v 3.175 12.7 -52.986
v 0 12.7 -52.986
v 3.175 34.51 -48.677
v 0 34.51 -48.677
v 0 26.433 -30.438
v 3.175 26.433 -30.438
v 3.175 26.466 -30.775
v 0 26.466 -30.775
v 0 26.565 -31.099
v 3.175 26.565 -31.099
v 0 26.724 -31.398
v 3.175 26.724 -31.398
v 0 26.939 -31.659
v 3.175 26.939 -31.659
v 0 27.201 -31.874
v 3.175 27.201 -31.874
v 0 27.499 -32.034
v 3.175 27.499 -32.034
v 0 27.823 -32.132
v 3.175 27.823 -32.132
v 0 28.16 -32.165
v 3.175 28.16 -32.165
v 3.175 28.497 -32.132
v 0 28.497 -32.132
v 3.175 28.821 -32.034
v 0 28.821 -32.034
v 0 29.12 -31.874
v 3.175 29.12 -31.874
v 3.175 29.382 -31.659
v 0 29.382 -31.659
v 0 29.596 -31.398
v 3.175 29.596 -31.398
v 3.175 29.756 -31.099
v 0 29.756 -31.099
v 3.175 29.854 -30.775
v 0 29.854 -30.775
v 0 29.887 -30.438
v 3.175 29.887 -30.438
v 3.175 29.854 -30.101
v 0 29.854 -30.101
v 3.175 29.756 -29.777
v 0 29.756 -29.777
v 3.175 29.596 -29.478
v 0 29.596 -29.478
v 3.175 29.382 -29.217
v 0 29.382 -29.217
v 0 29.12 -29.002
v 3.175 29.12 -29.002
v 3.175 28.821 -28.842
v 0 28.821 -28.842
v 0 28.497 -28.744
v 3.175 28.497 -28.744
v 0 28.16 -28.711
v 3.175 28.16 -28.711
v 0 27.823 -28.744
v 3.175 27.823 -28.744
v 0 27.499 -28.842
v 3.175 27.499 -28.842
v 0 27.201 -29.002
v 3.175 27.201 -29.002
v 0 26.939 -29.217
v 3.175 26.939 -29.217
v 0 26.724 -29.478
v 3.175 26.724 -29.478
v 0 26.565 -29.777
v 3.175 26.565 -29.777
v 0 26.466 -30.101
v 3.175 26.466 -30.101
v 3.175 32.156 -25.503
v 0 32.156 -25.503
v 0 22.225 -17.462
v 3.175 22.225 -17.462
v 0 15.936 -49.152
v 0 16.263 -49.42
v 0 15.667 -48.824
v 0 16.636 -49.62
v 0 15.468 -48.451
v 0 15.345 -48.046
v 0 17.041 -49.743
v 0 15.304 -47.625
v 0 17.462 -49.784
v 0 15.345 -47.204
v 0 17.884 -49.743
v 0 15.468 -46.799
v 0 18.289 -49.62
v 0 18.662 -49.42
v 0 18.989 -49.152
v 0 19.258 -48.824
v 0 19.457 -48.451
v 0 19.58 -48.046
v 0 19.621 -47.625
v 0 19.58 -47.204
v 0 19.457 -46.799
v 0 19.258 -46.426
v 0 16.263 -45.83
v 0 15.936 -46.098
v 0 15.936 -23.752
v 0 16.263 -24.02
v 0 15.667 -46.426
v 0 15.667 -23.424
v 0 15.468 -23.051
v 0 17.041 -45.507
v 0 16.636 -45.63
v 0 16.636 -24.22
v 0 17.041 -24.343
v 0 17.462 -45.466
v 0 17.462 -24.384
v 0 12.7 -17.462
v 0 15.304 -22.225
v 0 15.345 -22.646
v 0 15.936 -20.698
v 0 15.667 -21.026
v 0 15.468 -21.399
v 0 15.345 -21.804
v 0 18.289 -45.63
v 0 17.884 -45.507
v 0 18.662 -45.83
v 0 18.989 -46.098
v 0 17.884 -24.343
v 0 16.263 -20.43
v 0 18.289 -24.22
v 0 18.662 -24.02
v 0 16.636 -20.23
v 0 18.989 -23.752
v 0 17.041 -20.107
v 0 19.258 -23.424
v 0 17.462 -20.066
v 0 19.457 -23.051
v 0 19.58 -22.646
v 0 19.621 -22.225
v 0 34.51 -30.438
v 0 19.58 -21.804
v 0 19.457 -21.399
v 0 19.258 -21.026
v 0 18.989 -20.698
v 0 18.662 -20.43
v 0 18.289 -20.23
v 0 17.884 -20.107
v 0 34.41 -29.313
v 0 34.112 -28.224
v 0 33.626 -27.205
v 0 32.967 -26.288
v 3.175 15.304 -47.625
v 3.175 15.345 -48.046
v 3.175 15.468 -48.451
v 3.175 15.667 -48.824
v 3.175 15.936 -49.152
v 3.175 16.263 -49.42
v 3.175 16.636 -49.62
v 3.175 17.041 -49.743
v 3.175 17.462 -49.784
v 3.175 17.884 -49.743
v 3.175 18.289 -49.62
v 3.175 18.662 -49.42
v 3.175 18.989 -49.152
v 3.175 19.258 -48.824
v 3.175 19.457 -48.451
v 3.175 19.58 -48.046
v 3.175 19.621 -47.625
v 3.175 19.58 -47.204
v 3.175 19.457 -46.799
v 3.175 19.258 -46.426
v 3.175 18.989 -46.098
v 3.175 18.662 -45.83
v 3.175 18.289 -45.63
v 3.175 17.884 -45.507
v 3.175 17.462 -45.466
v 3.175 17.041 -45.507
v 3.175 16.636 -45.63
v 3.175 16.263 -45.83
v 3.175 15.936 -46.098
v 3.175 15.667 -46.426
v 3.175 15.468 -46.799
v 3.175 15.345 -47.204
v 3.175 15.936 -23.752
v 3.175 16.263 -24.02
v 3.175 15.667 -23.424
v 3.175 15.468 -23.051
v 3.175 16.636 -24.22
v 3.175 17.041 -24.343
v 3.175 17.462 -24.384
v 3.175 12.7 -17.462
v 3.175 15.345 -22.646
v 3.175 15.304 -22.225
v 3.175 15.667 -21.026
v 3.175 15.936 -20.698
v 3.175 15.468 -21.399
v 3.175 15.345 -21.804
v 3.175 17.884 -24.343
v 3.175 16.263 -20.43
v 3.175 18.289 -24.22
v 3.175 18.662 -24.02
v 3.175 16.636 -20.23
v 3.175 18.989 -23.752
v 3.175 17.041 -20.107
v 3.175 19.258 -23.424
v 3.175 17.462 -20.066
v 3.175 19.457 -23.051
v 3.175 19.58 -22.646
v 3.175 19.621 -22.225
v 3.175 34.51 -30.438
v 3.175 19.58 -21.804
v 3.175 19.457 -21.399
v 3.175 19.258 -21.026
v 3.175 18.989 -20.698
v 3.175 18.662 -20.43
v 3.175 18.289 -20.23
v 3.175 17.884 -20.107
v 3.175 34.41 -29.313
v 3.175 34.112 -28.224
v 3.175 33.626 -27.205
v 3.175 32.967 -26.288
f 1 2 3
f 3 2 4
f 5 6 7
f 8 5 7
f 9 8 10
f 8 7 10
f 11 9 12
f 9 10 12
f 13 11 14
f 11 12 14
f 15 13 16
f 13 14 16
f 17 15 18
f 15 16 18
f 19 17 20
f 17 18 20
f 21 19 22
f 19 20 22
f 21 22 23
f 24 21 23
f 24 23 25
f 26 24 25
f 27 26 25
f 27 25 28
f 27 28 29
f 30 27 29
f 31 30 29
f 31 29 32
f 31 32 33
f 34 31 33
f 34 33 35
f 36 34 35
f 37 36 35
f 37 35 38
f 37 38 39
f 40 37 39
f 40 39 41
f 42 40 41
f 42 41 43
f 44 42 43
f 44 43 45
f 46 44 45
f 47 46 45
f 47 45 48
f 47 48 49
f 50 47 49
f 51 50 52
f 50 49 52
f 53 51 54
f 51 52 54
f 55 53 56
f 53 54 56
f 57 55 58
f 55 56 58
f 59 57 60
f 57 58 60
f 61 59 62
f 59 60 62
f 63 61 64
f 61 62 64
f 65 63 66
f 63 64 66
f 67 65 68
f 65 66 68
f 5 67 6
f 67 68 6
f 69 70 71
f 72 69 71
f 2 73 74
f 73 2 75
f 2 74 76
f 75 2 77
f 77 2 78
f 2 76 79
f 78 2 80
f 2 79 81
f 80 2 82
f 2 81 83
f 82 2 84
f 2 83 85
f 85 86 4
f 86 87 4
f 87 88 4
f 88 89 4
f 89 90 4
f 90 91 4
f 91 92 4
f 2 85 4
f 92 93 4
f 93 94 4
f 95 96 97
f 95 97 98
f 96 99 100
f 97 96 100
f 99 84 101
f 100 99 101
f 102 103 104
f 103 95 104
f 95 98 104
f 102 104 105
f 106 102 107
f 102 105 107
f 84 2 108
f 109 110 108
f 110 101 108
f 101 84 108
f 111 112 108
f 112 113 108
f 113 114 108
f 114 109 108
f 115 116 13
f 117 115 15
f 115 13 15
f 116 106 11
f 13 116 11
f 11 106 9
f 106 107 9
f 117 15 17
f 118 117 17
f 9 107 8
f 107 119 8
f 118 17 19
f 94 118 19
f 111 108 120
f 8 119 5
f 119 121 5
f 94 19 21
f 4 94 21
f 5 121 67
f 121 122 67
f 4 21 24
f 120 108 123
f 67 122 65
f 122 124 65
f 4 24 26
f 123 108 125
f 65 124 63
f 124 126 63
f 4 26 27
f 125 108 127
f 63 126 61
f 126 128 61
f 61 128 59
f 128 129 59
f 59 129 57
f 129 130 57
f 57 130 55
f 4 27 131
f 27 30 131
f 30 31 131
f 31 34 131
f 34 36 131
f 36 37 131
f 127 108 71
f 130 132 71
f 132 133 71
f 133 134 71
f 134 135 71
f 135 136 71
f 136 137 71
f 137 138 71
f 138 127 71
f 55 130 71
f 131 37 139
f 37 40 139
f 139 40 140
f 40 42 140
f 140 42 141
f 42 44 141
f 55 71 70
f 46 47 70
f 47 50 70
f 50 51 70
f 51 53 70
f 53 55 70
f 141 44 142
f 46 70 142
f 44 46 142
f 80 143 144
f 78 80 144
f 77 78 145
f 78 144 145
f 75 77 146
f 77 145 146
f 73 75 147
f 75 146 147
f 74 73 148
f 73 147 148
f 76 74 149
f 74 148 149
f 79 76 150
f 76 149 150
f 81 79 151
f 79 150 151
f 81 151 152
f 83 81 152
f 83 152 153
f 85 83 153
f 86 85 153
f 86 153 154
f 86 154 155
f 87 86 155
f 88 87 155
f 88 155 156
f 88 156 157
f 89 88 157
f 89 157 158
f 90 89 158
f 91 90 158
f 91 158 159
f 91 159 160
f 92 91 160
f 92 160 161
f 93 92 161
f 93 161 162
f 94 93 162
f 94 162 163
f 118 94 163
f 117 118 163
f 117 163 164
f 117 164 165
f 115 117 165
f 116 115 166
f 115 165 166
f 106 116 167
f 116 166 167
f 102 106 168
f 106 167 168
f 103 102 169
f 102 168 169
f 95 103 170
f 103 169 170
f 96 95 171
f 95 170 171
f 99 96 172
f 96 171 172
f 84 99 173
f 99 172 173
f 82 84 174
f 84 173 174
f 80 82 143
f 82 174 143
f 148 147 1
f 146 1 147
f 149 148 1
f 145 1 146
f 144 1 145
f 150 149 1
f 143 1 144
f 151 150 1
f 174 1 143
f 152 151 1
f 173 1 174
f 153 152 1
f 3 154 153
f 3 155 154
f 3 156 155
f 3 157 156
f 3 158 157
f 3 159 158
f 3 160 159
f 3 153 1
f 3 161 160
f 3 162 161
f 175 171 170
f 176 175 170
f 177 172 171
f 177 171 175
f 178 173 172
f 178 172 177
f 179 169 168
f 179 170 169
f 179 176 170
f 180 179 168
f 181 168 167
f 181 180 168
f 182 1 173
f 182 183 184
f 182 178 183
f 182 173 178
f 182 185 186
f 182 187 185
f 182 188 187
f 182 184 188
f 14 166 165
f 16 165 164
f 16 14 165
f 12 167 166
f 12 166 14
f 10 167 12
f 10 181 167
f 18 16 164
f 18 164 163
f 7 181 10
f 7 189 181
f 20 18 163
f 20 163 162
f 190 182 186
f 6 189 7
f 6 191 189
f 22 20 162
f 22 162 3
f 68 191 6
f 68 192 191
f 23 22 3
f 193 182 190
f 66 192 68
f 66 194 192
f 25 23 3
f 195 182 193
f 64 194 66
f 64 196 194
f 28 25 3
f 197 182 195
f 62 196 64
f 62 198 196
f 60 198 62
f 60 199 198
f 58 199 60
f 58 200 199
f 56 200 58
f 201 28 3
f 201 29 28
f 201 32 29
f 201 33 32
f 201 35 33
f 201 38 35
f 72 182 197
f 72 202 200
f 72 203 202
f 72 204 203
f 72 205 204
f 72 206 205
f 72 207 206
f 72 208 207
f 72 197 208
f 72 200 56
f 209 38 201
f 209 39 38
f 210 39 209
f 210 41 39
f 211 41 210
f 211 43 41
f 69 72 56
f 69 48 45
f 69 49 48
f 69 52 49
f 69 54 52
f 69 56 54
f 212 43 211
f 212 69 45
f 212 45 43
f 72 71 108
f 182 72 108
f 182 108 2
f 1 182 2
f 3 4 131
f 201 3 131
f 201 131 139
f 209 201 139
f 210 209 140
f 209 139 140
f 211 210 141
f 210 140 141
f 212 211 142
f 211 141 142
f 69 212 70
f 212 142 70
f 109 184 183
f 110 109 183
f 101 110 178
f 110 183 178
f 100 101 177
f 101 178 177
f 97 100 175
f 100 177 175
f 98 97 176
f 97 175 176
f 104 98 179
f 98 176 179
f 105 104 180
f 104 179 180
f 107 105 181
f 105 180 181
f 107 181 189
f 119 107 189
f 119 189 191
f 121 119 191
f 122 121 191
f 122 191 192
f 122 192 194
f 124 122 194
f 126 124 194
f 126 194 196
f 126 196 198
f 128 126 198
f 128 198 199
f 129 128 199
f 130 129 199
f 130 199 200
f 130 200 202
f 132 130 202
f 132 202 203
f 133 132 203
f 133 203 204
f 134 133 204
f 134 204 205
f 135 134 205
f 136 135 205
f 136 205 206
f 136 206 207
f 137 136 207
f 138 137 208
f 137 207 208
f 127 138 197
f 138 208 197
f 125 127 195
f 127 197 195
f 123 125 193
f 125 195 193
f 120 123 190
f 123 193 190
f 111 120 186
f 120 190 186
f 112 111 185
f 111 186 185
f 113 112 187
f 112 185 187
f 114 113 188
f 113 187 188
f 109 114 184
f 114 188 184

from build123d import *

# Parameters (mm, degrees)
F1_DEPTH = 3.175
F2_D     = 3.4544
F2_DEPTH = 21.43125
F2_TIP   = 1.0378064612
F3_D     = 4.318
F3_DEPTH = 15.875
F3_TIP   = 1.2972580765


with BuildPart() as f1:
    # F0 (on Right) → F1 (new body)
    with BuildSketch(Plane.YZ):
        with BuildLine():
            Line((16.1557392643, -17.4625), (12.7, -17.4625))
            Line((12.7, -17.4625), (12.7, -52.986030559))
            Line((12.7, -52.986030559), (34.5102887852, -48.6771610688))
            Line((34.5102887852, -48.6771610688), (34.5102887852, -30.4380403067))
            ThreePointArc((34.5102887852, -30.4380403067), (33.8915652541, -27.7040011635), (32.1559675137, -25.5027539424))
            Line((32.1559675137, -25.5027539424), (22.225, -17.4625))
            Line((22.225, -17.4625), (16.1557392643, -17.4625))
        make_face()
    extrude(amount=F1_DEPTH)

    # F2
    with Locations(Plane(origin=(0, 0, 0), x_dir=(0, 1, 0), z_dir=(-1, 0, 0))):
        with Locations((28.1602887852, 30.4380403067)):
            Hole(F2_D / 2, depth=F2_DEPTH)
            with Locations((0, 0, -(F2_DEPTH + F2_TIP / 2))):  # 118° drill point
                Cone(0, F2_D / 2, F2_TIP, mode=Mode.SUBTRACT)

    # F3
    with Locations(Plane(origin=(0, 0, 0), x_dir=(0, 1, 0), z_dir=(-1, 0, 0))):
        with Locations((17.4625, 22.225), (17.4625, 47.625)):
            Hole(F3_D / 2, depth=F3_DEPTH)
            with Locations((0, 0, -(F3_DEPTH + F3_TIP / 2))):  # 118° drill point
                Cone(0, F3_D / 2, F3_TIP, mode=Mode.SUBTRACT)


solid = f1.part
